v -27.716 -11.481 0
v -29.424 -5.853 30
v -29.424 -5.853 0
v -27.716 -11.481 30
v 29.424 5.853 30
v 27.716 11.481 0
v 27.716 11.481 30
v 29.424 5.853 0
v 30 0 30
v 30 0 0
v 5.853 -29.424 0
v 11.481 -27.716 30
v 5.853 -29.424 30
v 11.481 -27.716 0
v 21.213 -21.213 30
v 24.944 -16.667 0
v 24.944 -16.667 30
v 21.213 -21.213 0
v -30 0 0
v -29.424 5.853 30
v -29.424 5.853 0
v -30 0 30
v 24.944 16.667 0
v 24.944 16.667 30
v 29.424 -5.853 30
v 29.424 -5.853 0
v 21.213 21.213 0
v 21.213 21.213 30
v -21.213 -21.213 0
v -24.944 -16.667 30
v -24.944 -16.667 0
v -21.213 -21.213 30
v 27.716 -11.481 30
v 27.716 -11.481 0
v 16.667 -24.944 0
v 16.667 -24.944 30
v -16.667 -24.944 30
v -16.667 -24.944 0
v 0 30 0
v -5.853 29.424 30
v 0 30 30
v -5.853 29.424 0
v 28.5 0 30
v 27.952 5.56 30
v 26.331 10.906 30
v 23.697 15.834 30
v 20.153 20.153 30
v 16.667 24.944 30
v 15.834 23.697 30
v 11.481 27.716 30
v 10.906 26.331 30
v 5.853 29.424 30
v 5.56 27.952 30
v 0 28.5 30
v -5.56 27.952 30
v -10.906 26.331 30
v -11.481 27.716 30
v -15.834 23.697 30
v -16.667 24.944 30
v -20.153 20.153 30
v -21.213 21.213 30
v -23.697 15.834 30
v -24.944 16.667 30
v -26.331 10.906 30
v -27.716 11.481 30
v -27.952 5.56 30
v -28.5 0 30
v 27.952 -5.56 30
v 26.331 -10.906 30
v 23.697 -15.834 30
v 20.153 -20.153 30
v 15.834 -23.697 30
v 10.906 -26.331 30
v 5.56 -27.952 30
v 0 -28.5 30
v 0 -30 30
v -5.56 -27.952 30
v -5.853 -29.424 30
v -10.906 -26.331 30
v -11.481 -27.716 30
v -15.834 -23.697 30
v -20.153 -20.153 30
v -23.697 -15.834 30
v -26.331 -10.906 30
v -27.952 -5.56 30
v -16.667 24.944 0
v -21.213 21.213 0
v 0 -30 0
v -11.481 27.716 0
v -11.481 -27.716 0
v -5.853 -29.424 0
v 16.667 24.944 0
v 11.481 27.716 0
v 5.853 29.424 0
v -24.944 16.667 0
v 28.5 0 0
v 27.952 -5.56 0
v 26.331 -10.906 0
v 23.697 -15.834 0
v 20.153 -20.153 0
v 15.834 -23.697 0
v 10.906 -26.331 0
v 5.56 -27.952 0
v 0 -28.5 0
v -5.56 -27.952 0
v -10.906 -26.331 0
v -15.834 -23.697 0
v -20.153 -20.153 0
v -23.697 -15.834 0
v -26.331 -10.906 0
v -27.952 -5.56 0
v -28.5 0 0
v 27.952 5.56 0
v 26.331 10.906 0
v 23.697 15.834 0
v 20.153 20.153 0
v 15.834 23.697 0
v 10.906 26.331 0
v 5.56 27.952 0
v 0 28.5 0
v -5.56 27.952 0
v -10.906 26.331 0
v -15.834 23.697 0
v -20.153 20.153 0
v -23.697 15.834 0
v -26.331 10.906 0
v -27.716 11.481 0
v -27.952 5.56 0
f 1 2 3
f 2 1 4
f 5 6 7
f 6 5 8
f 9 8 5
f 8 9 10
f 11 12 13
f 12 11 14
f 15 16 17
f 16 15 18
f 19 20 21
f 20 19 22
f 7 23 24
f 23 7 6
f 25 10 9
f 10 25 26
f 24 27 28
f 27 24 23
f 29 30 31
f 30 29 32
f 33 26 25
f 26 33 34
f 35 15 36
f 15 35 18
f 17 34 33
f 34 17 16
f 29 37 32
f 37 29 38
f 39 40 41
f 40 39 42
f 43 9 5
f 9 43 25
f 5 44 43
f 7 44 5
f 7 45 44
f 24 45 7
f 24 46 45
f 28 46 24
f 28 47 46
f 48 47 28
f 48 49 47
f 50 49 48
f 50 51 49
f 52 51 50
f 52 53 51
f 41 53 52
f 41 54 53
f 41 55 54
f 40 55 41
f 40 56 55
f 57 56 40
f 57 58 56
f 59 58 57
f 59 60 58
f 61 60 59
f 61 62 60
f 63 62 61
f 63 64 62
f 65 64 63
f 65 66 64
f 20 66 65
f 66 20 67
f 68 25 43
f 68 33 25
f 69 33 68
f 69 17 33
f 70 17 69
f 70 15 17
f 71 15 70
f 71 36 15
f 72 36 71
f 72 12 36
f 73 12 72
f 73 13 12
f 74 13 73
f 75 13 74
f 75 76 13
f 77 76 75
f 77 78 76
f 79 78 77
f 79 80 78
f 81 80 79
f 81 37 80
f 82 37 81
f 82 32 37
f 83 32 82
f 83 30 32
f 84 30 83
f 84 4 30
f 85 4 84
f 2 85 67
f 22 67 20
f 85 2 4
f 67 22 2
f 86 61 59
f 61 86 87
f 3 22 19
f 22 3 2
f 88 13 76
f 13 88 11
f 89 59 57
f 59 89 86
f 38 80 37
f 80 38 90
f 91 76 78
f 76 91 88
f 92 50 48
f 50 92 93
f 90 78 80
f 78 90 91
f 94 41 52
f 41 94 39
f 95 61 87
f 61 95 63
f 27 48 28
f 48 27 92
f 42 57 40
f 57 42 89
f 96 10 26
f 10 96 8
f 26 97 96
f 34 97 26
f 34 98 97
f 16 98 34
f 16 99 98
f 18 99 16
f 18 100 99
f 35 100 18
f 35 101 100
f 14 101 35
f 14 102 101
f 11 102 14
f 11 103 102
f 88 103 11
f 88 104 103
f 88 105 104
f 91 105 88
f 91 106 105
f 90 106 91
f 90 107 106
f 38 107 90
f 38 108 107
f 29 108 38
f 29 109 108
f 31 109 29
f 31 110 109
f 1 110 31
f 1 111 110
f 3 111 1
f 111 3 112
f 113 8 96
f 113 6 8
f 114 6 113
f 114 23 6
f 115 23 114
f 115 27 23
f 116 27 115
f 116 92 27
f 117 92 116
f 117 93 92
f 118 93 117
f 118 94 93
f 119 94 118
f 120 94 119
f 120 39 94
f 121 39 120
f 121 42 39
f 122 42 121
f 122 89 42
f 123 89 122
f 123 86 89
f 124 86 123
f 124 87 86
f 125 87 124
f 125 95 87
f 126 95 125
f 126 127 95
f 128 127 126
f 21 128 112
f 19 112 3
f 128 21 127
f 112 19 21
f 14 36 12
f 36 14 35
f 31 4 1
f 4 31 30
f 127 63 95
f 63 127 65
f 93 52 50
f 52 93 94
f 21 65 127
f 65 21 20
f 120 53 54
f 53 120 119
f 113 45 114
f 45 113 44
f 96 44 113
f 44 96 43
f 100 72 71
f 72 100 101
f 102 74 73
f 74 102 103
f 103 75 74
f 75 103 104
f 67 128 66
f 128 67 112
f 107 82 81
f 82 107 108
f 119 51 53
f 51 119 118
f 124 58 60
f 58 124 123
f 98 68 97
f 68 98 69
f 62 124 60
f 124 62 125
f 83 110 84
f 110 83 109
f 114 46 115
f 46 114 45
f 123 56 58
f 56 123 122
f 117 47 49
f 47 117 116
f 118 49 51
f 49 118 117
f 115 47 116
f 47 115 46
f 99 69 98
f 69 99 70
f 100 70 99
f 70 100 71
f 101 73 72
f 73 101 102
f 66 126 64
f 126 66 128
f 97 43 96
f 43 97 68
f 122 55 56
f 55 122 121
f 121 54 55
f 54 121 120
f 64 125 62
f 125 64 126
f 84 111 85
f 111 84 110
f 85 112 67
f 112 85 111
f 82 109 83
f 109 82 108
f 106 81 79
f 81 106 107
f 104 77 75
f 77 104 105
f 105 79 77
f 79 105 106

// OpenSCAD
$fn = 32;

// ----------------------------------------------------------------------
// Thin tube: 1.5 mm wall
// ----------------------------------------------------------------------

// --- parameters (mm) ---
tube_od = 60;             // outer diameter
tube_h = 30;              // height, Z
wall = 1.5;               // wall thickness

difference() {
  cylinder(h = tube_h, d = tube_od);
  translate([0, 0, -1]) cylinder(h = tube_h + 2, d = tube_od - 2 * wall);
}
